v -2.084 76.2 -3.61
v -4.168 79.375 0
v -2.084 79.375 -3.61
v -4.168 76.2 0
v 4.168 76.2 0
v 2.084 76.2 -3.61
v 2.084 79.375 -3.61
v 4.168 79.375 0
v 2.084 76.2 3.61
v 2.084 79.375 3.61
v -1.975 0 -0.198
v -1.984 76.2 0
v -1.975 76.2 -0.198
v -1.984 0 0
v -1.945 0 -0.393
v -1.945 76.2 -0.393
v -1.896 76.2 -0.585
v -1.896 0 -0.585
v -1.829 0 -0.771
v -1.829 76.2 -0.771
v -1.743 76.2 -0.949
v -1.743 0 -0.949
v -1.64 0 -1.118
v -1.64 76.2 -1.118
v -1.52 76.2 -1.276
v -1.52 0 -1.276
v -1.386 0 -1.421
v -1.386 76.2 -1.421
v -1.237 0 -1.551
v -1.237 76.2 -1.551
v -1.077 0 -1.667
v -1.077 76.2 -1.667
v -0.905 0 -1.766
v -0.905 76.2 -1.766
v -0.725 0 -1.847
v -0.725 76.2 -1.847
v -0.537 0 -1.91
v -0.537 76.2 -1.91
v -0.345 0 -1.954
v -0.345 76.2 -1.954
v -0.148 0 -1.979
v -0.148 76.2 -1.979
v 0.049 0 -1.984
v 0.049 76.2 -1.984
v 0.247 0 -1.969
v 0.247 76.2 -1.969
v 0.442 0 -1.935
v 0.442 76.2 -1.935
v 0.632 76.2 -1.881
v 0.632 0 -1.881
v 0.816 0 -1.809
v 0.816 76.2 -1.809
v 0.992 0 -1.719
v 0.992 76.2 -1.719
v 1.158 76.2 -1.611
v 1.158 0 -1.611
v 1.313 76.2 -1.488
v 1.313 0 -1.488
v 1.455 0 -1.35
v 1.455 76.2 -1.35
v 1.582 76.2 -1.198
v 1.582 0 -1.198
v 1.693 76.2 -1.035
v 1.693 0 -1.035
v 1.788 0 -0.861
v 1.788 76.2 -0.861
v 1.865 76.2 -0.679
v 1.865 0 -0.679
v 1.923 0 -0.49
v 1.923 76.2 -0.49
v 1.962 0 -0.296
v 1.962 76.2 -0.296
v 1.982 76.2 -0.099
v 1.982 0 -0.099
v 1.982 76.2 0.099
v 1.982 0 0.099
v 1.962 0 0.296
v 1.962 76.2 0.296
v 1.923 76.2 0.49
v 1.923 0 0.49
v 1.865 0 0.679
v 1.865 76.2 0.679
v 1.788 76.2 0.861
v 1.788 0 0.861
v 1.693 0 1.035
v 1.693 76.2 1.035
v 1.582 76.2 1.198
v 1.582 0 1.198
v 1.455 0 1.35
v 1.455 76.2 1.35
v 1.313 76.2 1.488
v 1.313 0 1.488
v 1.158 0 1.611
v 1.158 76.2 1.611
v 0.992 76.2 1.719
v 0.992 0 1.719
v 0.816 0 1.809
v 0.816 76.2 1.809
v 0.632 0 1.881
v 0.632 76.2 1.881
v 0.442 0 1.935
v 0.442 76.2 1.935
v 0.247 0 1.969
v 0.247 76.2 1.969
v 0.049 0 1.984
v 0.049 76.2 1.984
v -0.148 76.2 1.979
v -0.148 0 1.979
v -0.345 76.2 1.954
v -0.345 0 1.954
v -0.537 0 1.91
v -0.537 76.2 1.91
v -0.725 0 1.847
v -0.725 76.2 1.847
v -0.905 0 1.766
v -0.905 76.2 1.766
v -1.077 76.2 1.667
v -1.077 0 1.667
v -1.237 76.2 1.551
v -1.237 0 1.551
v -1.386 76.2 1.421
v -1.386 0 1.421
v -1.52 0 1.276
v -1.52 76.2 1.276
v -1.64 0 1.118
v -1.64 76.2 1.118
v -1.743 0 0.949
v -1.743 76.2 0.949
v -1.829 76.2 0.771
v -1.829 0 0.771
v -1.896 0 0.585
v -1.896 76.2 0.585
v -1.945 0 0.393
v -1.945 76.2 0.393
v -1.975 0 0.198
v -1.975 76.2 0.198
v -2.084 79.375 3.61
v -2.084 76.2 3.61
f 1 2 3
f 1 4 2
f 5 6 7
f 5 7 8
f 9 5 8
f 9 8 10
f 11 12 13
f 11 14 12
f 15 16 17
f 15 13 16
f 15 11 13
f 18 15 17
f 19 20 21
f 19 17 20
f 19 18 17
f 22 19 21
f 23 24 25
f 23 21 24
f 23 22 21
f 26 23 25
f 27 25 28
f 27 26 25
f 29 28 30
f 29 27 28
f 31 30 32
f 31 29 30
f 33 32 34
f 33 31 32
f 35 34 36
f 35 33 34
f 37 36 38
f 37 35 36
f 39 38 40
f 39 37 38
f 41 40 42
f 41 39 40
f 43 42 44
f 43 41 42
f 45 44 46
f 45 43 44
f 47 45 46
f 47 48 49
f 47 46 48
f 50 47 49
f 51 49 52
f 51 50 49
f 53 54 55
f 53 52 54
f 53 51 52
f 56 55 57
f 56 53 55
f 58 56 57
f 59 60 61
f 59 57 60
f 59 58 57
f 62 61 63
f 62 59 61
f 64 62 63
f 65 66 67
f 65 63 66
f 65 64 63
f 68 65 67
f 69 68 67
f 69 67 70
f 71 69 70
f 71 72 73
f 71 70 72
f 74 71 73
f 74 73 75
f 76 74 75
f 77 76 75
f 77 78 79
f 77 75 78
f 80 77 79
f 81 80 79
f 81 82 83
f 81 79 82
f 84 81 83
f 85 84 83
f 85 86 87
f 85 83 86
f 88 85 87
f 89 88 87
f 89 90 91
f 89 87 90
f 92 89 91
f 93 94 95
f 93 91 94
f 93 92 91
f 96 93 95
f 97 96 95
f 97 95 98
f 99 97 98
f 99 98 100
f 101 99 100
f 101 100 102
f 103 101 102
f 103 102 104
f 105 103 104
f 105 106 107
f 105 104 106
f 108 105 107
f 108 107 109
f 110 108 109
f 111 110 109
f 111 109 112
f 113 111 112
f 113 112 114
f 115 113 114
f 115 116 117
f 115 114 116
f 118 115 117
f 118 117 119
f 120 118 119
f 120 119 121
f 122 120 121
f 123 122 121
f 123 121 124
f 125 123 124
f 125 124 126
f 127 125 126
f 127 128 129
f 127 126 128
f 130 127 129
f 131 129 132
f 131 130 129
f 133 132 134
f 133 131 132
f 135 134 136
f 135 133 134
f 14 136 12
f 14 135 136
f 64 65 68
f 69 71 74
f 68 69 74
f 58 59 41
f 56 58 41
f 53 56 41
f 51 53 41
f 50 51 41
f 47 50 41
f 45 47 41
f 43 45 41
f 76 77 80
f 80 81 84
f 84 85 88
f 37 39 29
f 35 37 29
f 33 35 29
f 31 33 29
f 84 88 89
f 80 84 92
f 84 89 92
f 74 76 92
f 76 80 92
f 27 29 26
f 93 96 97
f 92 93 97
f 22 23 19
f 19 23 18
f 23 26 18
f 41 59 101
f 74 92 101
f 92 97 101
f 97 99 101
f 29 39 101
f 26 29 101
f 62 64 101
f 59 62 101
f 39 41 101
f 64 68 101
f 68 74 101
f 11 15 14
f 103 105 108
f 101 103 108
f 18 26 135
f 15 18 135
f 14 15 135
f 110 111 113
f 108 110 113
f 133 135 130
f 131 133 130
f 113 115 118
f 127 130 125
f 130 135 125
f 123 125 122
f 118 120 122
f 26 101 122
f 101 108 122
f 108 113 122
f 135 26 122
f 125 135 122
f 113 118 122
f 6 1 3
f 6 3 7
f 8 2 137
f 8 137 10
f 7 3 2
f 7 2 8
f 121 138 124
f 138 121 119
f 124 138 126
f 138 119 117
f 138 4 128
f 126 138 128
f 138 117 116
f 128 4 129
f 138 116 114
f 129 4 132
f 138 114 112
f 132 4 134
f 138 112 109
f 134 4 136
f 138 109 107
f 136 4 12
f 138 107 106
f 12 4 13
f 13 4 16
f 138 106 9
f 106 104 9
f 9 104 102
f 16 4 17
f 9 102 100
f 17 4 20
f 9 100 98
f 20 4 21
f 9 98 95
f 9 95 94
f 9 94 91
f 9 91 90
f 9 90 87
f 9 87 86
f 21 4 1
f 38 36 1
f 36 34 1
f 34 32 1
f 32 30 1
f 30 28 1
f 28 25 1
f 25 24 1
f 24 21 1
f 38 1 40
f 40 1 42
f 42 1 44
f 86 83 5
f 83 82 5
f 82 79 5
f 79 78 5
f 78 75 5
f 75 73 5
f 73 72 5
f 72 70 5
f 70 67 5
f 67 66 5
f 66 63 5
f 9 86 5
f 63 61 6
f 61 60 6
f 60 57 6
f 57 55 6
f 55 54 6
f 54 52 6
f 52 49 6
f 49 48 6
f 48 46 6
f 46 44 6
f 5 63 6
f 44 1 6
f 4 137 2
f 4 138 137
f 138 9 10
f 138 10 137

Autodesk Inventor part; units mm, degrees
ref_plane "YZ Plane" through (0, 0, 0) normal (1, 0, 0) x (0, 1, 0)
ref_plane "XZ Plane" through (0, 0, 0) normal (0, 1, 0) x (-1, 0, 0)
ref_plane "XY Plane" through (0, 0, 0) normal (0, 0, 1) x (1, 0, 0)
sketch "Sketch1" plane through (0, 0, 0) normal (0, 1, 0) x (-1, 0, 0)
  circle A0 centre (0, 0) radius 1.9844
  dimension "d0" = 3.9688
extrude "Extrusion1" add sketch "Sketch1" along normal blind 76.2
sketch "Sketch2" plane through (0, 76.2, 0) normal (0, 1, 0) x (1, 0, 0)
  line L0 (-4.1682, 0) -> (-2.0841, 3.6098)
  line L1 (-2.0841, 3.6098) -> (2.0841, 3.6098)
  line L2 (2.0841, 3.6098) -> (4.1682, 0)
  line L3 (4.1682, 0) -> (2.0841, -3.6098)
  line L4 (2.0841, -3.6098) -> (-2.0841, -3.6098)
  line L5 (-2.0841, -3.6098) -> (-4.1682, 0)
  point P0 (0, 0)
  point P1 (0, 0)
extrude "Extrusion2" add sketch "Sketch2" along normal blind 3.175
properties part number "Bag motor bolt"
